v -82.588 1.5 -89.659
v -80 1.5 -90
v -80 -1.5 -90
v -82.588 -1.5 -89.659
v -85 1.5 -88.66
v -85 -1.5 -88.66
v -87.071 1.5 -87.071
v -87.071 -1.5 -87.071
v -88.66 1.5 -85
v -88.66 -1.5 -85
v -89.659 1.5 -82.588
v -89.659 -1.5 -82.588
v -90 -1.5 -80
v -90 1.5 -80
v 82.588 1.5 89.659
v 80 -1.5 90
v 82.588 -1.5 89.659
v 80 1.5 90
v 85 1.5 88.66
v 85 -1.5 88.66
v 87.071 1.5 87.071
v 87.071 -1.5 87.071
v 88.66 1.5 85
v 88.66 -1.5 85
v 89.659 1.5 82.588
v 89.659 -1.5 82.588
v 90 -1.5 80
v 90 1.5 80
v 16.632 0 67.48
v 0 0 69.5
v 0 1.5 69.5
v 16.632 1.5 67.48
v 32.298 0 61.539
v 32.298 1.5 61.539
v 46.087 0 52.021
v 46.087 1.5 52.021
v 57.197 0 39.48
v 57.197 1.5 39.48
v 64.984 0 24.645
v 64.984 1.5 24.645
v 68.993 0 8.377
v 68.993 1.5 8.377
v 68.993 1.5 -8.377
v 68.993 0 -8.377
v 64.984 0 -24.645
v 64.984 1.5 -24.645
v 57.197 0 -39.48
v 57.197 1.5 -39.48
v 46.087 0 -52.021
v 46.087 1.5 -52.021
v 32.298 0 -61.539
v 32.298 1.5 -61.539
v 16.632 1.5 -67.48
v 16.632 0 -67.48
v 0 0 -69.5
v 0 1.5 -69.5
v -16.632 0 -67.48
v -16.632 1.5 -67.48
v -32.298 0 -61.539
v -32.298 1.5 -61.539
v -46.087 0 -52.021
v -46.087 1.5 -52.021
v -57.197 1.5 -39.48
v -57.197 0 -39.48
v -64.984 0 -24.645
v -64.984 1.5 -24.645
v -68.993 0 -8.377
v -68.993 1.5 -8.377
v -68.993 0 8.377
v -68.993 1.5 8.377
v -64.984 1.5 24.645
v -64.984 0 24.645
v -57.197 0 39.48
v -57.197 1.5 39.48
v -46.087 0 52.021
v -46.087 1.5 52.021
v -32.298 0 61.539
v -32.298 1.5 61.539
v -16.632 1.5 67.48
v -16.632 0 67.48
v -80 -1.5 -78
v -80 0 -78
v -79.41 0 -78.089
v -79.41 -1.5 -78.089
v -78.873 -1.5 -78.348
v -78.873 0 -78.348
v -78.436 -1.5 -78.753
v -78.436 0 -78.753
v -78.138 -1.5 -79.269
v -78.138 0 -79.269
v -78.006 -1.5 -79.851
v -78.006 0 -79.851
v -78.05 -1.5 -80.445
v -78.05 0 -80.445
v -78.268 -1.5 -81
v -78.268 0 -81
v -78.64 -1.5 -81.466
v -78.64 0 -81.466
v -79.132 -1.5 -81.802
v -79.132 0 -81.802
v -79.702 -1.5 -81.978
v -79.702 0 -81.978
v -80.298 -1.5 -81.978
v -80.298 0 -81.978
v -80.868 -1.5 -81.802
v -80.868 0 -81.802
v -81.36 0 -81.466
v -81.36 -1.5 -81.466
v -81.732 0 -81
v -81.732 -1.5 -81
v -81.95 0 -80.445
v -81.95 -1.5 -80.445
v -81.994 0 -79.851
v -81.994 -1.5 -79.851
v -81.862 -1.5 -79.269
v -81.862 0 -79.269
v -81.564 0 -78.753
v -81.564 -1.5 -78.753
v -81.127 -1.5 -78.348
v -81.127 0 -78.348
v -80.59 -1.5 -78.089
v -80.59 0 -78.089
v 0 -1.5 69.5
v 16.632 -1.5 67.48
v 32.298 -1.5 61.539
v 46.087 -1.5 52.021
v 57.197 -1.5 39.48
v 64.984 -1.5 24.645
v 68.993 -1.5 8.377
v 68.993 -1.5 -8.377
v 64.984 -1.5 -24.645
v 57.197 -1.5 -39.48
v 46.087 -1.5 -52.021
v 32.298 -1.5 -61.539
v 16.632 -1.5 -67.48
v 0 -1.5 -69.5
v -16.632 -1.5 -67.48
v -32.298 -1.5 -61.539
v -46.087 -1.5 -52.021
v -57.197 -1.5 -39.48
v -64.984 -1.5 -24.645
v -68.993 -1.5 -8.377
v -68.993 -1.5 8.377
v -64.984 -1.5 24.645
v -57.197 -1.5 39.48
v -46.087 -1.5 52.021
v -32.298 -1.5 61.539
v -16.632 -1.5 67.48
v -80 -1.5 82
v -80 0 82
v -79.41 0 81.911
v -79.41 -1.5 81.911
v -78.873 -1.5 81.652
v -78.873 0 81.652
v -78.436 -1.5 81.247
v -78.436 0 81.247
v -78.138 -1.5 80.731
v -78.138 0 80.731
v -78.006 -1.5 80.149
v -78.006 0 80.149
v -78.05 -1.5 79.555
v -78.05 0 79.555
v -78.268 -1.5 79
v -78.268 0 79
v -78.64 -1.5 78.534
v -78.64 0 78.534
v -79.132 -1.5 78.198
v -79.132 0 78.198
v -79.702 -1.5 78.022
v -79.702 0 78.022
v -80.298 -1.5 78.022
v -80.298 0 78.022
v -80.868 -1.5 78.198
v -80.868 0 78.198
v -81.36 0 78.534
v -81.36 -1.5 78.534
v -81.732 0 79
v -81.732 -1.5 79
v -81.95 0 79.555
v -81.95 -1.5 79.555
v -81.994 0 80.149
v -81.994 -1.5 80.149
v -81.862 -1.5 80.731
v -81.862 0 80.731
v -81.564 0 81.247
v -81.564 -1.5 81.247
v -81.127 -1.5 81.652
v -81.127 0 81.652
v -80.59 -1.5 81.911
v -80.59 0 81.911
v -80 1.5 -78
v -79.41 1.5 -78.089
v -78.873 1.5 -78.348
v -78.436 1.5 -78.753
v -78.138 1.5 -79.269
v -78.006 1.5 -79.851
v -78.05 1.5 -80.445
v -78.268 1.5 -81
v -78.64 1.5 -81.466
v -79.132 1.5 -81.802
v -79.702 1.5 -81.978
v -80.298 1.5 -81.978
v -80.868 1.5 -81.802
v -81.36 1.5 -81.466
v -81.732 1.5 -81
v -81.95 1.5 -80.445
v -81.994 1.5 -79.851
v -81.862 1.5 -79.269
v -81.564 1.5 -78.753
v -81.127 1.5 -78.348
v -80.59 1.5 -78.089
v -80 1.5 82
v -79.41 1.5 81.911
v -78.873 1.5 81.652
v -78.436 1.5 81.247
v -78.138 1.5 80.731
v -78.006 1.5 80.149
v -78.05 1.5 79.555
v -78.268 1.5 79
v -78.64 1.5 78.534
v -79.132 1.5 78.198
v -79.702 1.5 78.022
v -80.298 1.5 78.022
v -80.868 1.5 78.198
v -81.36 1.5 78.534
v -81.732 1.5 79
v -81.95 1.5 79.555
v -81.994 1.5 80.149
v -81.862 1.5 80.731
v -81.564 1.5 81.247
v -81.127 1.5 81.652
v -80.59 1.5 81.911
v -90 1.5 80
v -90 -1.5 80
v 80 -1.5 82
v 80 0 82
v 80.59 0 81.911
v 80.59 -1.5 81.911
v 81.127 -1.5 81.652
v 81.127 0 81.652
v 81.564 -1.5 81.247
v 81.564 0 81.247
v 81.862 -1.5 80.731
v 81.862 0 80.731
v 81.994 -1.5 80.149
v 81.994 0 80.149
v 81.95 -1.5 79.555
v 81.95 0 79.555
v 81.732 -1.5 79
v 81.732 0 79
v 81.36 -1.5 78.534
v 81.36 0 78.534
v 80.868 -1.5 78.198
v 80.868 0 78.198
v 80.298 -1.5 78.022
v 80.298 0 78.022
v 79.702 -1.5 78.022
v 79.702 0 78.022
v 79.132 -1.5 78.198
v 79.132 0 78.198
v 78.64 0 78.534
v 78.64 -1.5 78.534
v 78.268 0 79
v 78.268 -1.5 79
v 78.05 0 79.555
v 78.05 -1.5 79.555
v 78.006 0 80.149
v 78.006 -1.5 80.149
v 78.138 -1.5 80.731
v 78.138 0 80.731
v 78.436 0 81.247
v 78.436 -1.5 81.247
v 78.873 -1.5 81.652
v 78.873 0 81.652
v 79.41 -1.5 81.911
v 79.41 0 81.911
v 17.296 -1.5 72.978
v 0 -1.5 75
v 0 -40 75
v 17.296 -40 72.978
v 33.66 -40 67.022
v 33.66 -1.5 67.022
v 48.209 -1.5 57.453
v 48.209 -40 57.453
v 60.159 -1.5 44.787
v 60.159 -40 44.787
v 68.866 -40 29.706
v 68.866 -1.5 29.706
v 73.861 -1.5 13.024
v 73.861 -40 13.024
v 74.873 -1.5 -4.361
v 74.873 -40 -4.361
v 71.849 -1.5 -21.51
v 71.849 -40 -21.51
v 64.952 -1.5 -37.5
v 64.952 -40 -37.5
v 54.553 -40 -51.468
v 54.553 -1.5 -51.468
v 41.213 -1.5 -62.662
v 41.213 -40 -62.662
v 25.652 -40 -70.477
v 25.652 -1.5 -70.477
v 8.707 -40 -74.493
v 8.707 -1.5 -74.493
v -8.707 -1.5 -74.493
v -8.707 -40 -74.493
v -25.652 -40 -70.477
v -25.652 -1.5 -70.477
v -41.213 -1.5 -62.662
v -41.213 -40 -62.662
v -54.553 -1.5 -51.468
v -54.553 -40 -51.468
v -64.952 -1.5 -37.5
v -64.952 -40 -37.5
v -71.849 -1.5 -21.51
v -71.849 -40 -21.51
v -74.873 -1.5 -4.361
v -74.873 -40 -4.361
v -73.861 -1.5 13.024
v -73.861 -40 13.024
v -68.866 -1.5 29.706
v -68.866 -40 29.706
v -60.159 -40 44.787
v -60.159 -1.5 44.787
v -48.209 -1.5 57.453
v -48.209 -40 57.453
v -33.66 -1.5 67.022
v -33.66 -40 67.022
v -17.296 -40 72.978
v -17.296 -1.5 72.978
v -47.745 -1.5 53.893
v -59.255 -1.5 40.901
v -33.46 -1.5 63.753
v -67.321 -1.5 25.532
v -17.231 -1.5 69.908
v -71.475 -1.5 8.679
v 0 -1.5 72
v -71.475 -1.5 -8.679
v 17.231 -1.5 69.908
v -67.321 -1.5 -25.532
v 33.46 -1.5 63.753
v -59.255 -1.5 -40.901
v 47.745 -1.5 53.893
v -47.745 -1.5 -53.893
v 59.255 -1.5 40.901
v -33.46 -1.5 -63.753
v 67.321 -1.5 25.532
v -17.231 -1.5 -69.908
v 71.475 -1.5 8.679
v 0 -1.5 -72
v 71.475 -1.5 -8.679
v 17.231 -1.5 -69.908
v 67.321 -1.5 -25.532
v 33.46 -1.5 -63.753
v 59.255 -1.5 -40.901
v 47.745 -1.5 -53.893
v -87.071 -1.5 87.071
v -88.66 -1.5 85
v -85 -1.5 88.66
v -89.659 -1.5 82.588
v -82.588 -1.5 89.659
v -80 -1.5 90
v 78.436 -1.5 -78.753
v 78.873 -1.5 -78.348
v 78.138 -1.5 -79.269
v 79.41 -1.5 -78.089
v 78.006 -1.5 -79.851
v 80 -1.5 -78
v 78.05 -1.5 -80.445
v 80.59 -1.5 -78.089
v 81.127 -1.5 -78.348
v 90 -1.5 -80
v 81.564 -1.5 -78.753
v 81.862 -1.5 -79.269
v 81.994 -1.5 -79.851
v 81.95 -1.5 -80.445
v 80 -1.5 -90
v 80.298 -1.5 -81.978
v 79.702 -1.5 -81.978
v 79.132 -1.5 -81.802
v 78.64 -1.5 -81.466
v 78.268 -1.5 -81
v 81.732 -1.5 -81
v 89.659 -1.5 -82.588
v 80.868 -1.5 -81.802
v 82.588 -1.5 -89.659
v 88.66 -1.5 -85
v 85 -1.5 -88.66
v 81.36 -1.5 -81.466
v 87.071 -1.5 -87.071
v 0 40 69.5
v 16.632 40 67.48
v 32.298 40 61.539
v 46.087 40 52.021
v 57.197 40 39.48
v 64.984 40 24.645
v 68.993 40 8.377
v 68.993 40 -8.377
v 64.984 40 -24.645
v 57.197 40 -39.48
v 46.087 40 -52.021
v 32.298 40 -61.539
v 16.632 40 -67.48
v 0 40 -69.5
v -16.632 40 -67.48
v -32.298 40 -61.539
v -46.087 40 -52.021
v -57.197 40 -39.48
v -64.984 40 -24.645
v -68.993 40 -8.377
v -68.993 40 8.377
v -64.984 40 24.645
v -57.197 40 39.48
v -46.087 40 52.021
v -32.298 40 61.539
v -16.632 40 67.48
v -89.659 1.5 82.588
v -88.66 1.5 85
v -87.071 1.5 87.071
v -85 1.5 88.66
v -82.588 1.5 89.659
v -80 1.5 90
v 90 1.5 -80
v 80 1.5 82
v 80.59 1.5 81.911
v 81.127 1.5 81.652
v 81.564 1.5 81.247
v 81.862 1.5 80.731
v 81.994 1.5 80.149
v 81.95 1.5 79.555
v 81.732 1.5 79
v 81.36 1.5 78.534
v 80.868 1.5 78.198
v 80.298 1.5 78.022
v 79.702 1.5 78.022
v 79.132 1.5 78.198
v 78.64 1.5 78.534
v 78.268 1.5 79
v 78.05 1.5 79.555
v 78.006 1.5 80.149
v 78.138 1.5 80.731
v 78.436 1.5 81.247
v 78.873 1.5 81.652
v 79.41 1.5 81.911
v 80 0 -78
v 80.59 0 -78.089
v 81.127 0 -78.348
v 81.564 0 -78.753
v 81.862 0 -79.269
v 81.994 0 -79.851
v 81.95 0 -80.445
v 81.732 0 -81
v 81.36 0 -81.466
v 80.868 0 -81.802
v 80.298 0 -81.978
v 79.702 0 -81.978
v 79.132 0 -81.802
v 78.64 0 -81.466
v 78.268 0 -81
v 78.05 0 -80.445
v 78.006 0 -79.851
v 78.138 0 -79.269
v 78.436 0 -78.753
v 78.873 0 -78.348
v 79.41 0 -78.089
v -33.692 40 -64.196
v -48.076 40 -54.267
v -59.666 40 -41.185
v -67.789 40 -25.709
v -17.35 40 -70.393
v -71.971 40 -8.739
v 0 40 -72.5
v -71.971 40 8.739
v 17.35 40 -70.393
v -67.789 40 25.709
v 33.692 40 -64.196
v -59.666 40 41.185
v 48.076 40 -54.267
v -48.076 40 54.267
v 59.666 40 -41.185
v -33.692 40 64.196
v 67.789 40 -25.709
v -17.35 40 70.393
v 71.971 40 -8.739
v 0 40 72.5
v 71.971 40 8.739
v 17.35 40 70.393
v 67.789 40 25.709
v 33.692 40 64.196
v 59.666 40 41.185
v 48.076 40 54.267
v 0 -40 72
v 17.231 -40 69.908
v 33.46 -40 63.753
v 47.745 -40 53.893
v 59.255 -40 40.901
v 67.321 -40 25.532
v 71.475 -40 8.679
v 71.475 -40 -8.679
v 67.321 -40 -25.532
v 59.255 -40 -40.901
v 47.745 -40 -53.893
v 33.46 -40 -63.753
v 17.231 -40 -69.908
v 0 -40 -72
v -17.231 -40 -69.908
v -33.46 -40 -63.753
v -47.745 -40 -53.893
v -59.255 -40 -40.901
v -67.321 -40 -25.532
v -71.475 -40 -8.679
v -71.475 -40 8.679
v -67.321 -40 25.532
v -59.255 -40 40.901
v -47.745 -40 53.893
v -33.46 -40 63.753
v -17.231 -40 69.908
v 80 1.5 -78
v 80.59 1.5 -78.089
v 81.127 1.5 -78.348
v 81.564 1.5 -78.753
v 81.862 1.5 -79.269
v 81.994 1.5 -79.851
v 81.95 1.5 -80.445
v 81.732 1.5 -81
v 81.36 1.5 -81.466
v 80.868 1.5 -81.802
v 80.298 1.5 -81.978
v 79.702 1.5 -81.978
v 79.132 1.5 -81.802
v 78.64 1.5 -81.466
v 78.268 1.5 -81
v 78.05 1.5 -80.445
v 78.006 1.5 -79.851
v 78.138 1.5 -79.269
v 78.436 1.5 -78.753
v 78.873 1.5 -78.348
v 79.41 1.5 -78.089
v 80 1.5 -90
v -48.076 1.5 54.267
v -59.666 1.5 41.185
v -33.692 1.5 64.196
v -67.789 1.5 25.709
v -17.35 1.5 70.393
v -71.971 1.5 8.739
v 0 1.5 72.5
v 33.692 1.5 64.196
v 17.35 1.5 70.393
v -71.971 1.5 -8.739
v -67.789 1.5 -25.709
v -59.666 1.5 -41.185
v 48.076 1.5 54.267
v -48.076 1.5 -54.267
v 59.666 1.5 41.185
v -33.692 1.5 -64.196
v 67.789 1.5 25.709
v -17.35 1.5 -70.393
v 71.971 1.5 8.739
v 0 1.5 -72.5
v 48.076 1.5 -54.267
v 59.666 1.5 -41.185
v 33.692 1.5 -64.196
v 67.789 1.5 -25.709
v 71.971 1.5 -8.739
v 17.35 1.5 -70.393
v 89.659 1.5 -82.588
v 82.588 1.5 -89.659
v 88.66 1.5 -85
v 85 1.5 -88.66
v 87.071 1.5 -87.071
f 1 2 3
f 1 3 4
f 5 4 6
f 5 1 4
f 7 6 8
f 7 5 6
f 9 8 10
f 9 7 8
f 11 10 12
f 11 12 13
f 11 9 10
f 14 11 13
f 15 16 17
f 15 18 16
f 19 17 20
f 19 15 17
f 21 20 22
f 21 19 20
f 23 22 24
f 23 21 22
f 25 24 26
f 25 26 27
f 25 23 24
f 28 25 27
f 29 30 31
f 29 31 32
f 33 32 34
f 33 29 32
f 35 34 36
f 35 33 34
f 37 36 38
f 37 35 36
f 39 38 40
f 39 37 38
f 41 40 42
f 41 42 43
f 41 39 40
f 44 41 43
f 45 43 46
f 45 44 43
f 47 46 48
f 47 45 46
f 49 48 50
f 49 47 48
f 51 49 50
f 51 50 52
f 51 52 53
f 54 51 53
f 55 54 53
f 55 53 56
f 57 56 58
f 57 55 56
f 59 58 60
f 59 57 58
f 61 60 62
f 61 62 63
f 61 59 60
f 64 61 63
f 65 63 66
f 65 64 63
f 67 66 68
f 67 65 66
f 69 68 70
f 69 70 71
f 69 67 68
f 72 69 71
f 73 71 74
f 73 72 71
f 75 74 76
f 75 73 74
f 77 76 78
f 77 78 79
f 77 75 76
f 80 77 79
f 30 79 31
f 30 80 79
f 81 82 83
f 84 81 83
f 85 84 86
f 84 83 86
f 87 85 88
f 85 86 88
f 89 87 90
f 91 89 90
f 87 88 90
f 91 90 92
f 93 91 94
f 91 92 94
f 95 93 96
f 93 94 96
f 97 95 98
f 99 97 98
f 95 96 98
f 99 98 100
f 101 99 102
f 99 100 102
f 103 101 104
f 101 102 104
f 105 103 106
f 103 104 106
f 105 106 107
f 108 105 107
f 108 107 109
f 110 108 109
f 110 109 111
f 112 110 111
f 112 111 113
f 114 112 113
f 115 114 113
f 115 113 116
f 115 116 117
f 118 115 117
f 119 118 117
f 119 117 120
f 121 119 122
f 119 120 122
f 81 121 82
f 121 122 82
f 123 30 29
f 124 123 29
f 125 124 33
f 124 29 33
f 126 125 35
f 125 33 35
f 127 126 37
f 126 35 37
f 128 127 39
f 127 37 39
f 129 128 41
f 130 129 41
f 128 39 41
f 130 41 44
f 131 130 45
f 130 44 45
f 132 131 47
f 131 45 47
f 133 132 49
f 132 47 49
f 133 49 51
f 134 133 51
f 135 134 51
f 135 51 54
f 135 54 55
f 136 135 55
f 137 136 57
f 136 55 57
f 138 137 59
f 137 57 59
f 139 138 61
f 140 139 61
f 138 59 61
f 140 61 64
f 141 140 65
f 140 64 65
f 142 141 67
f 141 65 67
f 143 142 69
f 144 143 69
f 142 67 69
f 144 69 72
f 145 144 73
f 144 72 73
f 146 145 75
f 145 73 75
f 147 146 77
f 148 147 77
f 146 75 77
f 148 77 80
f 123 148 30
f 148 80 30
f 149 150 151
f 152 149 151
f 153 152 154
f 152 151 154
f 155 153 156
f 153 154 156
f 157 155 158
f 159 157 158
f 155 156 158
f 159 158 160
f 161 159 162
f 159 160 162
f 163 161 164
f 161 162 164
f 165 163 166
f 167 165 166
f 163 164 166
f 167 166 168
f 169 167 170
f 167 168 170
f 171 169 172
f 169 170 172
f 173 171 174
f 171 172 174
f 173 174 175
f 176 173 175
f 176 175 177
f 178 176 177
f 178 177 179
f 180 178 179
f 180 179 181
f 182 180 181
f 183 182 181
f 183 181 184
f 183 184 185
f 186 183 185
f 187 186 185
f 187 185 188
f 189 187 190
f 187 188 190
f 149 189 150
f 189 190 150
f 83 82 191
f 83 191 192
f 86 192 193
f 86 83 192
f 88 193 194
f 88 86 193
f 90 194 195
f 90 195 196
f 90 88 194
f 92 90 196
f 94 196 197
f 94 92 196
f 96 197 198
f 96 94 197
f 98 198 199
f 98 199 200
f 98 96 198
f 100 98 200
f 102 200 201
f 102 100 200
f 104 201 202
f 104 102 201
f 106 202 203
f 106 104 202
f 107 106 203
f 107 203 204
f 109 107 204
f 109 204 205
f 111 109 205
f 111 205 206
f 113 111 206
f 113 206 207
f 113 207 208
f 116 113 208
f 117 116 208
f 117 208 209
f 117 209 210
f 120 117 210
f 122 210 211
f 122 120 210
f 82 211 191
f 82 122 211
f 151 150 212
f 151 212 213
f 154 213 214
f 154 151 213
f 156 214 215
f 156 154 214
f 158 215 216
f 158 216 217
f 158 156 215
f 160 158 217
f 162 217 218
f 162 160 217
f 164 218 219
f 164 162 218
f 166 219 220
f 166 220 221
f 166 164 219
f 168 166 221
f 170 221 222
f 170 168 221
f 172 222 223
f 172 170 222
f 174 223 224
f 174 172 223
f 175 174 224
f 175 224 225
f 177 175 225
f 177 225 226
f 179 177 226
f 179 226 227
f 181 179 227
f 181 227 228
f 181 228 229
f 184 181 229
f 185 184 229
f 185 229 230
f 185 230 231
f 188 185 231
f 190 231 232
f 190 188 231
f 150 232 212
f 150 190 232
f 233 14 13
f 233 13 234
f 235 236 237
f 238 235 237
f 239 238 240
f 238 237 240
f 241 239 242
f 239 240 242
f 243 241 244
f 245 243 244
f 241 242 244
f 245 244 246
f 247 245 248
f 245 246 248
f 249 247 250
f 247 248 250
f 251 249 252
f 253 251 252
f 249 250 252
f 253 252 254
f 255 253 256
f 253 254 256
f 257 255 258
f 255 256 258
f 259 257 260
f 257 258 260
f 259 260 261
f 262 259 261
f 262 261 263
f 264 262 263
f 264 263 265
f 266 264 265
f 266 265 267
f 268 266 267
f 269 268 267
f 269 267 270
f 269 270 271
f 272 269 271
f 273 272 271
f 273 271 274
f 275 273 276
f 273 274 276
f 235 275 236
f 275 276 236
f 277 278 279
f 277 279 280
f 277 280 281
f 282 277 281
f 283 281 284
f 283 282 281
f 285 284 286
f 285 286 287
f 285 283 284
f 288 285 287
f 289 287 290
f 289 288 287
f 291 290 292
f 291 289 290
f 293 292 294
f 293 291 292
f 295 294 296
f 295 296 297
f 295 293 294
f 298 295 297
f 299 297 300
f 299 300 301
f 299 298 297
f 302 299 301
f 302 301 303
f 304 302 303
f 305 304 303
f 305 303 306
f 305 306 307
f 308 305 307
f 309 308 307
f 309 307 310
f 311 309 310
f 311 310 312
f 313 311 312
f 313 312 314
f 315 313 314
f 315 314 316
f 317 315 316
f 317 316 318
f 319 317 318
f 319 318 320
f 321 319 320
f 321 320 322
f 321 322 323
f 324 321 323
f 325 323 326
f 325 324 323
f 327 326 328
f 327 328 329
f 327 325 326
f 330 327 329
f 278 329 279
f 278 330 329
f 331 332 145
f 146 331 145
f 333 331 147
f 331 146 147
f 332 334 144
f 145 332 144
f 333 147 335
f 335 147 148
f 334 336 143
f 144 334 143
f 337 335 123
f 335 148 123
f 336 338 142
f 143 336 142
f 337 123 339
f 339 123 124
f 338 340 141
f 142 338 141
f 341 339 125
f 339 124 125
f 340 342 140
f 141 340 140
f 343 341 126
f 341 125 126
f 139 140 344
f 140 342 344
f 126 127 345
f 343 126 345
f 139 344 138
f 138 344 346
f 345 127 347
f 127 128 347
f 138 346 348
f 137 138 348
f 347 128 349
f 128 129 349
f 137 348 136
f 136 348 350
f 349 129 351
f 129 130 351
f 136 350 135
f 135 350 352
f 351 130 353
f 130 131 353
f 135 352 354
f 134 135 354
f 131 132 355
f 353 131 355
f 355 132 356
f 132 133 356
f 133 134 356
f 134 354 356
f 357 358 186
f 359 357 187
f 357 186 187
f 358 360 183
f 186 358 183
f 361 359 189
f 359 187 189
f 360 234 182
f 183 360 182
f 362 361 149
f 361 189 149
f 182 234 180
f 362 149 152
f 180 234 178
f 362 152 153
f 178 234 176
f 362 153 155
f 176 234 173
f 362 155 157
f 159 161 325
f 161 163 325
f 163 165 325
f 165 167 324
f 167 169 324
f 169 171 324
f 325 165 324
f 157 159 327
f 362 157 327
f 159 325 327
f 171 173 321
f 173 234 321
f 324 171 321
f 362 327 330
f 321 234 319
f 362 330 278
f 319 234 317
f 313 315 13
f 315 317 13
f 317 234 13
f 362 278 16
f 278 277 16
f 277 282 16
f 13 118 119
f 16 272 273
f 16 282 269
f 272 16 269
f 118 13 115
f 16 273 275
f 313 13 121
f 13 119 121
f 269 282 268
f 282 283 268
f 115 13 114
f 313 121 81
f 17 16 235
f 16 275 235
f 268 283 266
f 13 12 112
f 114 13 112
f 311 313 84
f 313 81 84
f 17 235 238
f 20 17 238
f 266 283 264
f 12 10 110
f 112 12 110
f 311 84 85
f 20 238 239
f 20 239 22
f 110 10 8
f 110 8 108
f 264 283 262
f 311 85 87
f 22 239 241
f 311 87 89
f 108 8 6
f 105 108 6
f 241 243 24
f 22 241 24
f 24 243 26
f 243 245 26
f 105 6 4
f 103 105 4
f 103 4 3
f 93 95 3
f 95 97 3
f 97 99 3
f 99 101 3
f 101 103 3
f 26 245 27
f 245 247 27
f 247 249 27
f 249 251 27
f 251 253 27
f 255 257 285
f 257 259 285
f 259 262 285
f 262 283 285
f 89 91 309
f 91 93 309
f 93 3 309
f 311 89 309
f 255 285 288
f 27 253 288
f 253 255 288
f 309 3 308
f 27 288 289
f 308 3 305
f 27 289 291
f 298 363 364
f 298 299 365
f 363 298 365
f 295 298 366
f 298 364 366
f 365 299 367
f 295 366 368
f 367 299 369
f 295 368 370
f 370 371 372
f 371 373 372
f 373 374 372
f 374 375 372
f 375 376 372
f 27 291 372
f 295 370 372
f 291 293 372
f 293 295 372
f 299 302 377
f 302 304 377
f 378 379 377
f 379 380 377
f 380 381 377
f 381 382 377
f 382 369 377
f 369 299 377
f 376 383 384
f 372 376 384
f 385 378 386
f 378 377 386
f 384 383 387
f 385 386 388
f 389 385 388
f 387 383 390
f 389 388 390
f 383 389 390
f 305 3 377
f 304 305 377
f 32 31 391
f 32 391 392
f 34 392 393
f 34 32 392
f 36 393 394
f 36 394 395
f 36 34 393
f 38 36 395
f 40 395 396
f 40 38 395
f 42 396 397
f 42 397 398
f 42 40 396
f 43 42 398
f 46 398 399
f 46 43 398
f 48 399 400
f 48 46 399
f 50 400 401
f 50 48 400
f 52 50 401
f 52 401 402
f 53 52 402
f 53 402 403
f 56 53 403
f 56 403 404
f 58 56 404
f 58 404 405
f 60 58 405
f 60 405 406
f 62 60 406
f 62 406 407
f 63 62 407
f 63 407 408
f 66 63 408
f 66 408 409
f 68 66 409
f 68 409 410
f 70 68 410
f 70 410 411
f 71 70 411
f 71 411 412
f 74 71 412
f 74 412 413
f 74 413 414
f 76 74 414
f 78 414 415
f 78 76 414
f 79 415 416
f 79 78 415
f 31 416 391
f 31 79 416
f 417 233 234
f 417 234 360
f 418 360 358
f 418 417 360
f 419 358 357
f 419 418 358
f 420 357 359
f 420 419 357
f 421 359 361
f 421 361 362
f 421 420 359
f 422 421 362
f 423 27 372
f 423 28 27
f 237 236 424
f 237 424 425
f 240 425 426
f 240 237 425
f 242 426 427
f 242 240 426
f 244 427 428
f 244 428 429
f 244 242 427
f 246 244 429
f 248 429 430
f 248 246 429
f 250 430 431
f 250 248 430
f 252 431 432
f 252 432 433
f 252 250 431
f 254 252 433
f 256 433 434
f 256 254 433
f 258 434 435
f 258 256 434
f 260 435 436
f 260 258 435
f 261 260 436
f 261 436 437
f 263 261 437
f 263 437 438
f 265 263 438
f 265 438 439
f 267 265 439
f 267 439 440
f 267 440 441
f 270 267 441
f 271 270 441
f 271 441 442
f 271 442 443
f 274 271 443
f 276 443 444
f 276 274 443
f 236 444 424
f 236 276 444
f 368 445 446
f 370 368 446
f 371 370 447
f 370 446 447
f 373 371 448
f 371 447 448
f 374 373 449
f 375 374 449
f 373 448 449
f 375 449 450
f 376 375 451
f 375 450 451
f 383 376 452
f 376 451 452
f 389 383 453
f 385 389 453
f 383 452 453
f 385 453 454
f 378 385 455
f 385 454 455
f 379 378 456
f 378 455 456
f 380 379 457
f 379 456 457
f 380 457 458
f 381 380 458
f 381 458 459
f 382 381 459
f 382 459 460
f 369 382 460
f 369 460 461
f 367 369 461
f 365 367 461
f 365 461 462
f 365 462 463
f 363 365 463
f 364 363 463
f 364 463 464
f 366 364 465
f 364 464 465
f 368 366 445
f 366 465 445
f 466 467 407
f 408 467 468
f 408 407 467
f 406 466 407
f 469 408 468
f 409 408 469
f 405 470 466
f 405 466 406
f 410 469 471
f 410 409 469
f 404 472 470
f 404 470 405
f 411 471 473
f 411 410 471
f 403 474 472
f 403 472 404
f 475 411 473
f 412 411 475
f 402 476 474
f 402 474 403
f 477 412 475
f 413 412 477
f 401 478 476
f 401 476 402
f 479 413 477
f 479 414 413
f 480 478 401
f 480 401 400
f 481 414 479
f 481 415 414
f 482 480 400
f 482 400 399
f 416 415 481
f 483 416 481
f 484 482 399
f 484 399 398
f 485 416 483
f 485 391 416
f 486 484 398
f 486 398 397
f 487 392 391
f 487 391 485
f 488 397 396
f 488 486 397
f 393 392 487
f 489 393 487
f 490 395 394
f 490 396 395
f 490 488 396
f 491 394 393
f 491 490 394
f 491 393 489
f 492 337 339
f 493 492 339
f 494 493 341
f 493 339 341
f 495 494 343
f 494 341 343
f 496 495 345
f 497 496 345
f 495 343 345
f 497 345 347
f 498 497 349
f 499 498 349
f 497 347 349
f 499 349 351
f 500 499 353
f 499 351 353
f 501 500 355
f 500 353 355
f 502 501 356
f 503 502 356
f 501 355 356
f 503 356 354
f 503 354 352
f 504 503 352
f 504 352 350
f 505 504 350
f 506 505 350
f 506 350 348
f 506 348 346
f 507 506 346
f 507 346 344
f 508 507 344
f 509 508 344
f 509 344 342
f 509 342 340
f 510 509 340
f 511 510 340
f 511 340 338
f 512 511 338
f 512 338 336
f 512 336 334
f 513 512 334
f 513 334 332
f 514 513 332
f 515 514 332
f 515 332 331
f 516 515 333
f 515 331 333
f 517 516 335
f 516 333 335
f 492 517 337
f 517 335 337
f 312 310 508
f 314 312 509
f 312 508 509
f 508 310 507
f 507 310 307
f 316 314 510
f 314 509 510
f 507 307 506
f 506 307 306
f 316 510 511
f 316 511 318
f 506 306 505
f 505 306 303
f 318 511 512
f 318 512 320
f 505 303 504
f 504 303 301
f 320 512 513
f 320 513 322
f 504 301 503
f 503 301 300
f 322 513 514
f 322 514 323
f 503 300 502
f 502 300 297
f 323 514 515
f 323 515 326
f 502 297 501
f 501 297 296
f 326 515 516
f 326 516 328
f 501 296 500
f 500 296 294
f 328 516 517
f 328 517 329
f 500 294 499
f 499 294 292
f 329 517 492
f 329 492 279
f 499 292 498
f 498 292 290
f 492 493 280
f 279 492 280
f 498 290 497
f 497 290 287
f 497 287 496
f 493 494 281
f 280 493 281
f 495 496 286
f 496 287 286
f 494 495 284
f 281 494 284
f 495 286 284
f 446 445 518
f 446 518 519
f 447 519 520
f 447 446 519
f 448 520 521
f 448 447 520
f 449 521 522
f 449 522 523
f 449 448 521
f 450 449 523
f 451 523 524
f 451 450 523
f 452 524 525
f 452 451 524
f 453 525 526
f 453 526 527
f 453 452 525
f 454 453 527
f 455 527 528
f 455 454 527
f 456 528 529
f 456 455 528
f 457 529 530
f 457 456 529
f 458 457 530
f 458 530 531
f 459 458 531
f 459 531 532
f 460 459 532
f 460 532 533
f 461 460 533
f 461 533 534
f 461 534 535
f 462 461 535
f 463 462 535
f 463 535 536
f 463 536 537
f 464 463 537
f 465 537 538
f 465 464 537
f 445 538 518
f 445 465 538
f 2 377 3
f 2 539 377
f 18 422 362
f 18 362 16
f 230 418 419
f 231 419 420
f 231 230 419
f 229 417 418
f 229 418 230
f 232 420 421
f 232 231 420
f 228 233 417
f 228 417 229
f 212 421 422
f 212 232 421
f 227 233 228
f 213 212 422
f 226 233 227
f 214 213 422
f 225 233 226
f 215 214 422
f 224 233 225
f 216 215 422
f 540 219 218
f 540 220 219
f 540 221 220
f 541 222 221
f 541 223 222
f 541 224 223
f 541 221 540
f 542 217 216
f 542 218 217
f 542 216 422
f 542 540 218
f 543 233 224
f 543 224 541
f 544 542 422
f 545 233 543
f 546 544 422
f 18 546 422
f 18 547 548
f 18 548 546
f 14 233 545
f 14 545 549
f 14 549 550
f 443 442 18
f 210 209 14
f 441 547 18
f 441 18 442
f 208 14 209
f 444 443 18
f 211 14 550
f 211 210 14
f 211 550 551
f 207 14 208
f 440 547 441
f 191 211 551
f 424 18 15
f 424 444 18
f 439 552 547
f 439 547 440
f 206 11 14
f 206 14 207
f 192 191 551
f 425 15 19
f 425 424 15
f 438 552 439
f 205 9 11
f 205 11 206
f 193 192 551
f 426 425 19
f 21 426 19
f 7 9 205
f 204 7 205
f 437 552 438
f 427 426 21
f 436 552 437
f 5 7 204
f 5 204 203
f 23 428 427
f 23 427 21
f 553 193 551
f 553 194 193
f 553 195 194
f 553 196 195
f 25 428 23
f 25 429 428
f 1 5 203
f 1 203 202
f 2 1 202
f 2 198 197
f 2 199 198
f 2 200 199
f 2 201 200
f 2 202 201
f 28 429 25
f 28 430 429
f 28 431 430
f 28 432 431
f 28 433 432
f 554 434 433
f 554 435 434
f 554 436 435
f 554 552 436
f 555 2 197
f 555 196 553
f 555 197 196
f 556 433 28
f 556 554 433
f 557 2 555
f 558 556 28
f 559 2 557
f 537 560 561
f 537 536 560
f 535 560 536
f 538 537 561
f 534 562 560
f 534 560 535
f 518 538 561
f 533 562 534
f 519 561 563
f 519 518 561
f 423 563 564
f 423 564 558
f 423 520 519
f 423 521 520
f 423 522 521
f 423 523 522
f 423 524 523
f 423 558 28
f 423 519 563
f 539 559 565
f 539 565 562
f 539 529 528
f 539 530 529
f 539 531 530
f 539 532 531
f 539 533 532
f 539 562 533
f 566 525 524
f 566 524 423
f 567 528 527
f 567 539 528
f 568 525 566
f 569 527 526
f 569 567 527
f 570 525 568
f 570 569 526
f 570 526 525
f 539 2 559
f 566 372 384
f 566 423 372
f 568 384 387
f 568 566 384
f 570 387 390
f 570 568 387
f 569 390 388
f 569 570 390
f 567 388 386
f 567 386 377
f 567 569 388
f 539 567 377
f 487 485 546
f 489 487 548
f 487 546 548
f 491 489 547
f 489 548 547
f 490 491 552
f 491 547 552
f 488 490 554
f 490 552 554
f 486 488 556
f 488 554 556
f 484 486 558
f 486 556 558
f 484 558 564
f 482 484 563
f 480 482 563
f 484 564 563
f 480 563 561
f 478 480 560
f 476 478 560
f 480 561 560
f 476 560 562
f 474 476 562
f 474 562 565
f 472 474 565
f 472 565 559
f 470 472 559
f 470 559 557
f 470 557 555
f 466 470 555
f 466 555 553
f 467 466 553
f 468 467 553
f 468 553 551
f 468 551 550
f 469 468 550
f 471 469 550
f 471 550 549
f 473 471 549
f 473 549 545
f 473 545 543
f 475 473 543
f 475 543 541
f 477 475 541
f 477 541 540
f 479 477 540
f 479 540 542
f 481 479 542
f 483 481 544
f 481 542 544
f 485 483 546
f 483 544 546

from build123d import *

# Parameters (mm, degrees)
BOSS_EXTRUDE3_DEPTH      = 1.5
BOSS_EXTRUDE3_DEPTH_BACK = 1.5
SKETCH1_R                = 2
SKETCH1_R_2              = 69.5
SKETCH2_R                = 72.5
SKETCH2_R_2              = 69.5
BOSS_EXTRUDE4_DEPTH      = 40
SKETCH4_R                = 75
SKETCH4_R_2              = 72
BOSS_EXTRUDE6_DEPTH      = 40


with BuildPart() as part:
    # Sketch1 → Boss-Extrude3 (new, two sides: drawn at the far end of the back side and taken through both)
    with BuildSketch(Plane(origin=(0, 0, 0), x_dir=(1, 0, 0), z_dir=(0, 1, 0)).offset(-BOSS_EXTRUDE3_DEPTH_BACK)):
        with BuildLine():
            ThreePointArc((90, 80), (87.071067812, 87.071067812), (80, 90))
            Line((80, 90), (-80, 90))
            ThreePointArc((-80, 90), (-87.071067812, 87.071067812), (-90, 80))
            Line((-90, 80), (-90, -80))
            ThreePointArc((-90, -80), (-87.071067812, -87.071067812), (-80, -90))
            Line((-80, -90), (80, -90))
            ThreePointArc((80, -90), (87.071067812, -87.071067812), (90, -80))
            Line((90, -80), (90, 80))
        make_face()
        with Locations((-80, -80)):
            Circle(SKETCH1_R, mode=Mode.SUBTRACT)
        with Locations((80, -80)):
            Circle(SKETCH1_R, mode=Mode.SUBTRACT)
        Circle(SKETCH1_R_2, mode=Mode.SUBTRACT)
        with Locations((-80, 80)):
            Circle(SKETCH1_R, mode=Mode.SUBTRACT)
        with Locations((80, 80)):
            Circle(SKETCH1_R, mode=Mode.SUBTRACT)
    extrude(amount=BOSS_EXTRUDE3_DEPTH + BOSS_EXTRUDE3_DEPTH_BACK)

    # Sketch2 → Boss-Extrude4 (add)
    with BuildSketch(Plane(origin=(0, 0, 0), x_dir=(1, 0, 0), z_dir=(0, 1, 0))):
        Circle(SKETCH2_R)
        Circle(SKETCH2_R_2, mode=Mode.SUBTRACT)
    extrude(amount=BOSS_EXTRUDE4_DEPTH)

    # Sketch4 → Boss-Extrude6 (add)
    with BuildSketch(Plane(origin=(0, 0, 0), x_dir=(1, 0, 0), z_dir=(0, 1, 0))):
        Circle(SKETCH4_R)
        Circle(SKETCH4_R_2, mode=Mode.SUBTRACT)
    extrude(amount=-BOSS_EXTRUDE6_DEPTH)


solid = part.part
